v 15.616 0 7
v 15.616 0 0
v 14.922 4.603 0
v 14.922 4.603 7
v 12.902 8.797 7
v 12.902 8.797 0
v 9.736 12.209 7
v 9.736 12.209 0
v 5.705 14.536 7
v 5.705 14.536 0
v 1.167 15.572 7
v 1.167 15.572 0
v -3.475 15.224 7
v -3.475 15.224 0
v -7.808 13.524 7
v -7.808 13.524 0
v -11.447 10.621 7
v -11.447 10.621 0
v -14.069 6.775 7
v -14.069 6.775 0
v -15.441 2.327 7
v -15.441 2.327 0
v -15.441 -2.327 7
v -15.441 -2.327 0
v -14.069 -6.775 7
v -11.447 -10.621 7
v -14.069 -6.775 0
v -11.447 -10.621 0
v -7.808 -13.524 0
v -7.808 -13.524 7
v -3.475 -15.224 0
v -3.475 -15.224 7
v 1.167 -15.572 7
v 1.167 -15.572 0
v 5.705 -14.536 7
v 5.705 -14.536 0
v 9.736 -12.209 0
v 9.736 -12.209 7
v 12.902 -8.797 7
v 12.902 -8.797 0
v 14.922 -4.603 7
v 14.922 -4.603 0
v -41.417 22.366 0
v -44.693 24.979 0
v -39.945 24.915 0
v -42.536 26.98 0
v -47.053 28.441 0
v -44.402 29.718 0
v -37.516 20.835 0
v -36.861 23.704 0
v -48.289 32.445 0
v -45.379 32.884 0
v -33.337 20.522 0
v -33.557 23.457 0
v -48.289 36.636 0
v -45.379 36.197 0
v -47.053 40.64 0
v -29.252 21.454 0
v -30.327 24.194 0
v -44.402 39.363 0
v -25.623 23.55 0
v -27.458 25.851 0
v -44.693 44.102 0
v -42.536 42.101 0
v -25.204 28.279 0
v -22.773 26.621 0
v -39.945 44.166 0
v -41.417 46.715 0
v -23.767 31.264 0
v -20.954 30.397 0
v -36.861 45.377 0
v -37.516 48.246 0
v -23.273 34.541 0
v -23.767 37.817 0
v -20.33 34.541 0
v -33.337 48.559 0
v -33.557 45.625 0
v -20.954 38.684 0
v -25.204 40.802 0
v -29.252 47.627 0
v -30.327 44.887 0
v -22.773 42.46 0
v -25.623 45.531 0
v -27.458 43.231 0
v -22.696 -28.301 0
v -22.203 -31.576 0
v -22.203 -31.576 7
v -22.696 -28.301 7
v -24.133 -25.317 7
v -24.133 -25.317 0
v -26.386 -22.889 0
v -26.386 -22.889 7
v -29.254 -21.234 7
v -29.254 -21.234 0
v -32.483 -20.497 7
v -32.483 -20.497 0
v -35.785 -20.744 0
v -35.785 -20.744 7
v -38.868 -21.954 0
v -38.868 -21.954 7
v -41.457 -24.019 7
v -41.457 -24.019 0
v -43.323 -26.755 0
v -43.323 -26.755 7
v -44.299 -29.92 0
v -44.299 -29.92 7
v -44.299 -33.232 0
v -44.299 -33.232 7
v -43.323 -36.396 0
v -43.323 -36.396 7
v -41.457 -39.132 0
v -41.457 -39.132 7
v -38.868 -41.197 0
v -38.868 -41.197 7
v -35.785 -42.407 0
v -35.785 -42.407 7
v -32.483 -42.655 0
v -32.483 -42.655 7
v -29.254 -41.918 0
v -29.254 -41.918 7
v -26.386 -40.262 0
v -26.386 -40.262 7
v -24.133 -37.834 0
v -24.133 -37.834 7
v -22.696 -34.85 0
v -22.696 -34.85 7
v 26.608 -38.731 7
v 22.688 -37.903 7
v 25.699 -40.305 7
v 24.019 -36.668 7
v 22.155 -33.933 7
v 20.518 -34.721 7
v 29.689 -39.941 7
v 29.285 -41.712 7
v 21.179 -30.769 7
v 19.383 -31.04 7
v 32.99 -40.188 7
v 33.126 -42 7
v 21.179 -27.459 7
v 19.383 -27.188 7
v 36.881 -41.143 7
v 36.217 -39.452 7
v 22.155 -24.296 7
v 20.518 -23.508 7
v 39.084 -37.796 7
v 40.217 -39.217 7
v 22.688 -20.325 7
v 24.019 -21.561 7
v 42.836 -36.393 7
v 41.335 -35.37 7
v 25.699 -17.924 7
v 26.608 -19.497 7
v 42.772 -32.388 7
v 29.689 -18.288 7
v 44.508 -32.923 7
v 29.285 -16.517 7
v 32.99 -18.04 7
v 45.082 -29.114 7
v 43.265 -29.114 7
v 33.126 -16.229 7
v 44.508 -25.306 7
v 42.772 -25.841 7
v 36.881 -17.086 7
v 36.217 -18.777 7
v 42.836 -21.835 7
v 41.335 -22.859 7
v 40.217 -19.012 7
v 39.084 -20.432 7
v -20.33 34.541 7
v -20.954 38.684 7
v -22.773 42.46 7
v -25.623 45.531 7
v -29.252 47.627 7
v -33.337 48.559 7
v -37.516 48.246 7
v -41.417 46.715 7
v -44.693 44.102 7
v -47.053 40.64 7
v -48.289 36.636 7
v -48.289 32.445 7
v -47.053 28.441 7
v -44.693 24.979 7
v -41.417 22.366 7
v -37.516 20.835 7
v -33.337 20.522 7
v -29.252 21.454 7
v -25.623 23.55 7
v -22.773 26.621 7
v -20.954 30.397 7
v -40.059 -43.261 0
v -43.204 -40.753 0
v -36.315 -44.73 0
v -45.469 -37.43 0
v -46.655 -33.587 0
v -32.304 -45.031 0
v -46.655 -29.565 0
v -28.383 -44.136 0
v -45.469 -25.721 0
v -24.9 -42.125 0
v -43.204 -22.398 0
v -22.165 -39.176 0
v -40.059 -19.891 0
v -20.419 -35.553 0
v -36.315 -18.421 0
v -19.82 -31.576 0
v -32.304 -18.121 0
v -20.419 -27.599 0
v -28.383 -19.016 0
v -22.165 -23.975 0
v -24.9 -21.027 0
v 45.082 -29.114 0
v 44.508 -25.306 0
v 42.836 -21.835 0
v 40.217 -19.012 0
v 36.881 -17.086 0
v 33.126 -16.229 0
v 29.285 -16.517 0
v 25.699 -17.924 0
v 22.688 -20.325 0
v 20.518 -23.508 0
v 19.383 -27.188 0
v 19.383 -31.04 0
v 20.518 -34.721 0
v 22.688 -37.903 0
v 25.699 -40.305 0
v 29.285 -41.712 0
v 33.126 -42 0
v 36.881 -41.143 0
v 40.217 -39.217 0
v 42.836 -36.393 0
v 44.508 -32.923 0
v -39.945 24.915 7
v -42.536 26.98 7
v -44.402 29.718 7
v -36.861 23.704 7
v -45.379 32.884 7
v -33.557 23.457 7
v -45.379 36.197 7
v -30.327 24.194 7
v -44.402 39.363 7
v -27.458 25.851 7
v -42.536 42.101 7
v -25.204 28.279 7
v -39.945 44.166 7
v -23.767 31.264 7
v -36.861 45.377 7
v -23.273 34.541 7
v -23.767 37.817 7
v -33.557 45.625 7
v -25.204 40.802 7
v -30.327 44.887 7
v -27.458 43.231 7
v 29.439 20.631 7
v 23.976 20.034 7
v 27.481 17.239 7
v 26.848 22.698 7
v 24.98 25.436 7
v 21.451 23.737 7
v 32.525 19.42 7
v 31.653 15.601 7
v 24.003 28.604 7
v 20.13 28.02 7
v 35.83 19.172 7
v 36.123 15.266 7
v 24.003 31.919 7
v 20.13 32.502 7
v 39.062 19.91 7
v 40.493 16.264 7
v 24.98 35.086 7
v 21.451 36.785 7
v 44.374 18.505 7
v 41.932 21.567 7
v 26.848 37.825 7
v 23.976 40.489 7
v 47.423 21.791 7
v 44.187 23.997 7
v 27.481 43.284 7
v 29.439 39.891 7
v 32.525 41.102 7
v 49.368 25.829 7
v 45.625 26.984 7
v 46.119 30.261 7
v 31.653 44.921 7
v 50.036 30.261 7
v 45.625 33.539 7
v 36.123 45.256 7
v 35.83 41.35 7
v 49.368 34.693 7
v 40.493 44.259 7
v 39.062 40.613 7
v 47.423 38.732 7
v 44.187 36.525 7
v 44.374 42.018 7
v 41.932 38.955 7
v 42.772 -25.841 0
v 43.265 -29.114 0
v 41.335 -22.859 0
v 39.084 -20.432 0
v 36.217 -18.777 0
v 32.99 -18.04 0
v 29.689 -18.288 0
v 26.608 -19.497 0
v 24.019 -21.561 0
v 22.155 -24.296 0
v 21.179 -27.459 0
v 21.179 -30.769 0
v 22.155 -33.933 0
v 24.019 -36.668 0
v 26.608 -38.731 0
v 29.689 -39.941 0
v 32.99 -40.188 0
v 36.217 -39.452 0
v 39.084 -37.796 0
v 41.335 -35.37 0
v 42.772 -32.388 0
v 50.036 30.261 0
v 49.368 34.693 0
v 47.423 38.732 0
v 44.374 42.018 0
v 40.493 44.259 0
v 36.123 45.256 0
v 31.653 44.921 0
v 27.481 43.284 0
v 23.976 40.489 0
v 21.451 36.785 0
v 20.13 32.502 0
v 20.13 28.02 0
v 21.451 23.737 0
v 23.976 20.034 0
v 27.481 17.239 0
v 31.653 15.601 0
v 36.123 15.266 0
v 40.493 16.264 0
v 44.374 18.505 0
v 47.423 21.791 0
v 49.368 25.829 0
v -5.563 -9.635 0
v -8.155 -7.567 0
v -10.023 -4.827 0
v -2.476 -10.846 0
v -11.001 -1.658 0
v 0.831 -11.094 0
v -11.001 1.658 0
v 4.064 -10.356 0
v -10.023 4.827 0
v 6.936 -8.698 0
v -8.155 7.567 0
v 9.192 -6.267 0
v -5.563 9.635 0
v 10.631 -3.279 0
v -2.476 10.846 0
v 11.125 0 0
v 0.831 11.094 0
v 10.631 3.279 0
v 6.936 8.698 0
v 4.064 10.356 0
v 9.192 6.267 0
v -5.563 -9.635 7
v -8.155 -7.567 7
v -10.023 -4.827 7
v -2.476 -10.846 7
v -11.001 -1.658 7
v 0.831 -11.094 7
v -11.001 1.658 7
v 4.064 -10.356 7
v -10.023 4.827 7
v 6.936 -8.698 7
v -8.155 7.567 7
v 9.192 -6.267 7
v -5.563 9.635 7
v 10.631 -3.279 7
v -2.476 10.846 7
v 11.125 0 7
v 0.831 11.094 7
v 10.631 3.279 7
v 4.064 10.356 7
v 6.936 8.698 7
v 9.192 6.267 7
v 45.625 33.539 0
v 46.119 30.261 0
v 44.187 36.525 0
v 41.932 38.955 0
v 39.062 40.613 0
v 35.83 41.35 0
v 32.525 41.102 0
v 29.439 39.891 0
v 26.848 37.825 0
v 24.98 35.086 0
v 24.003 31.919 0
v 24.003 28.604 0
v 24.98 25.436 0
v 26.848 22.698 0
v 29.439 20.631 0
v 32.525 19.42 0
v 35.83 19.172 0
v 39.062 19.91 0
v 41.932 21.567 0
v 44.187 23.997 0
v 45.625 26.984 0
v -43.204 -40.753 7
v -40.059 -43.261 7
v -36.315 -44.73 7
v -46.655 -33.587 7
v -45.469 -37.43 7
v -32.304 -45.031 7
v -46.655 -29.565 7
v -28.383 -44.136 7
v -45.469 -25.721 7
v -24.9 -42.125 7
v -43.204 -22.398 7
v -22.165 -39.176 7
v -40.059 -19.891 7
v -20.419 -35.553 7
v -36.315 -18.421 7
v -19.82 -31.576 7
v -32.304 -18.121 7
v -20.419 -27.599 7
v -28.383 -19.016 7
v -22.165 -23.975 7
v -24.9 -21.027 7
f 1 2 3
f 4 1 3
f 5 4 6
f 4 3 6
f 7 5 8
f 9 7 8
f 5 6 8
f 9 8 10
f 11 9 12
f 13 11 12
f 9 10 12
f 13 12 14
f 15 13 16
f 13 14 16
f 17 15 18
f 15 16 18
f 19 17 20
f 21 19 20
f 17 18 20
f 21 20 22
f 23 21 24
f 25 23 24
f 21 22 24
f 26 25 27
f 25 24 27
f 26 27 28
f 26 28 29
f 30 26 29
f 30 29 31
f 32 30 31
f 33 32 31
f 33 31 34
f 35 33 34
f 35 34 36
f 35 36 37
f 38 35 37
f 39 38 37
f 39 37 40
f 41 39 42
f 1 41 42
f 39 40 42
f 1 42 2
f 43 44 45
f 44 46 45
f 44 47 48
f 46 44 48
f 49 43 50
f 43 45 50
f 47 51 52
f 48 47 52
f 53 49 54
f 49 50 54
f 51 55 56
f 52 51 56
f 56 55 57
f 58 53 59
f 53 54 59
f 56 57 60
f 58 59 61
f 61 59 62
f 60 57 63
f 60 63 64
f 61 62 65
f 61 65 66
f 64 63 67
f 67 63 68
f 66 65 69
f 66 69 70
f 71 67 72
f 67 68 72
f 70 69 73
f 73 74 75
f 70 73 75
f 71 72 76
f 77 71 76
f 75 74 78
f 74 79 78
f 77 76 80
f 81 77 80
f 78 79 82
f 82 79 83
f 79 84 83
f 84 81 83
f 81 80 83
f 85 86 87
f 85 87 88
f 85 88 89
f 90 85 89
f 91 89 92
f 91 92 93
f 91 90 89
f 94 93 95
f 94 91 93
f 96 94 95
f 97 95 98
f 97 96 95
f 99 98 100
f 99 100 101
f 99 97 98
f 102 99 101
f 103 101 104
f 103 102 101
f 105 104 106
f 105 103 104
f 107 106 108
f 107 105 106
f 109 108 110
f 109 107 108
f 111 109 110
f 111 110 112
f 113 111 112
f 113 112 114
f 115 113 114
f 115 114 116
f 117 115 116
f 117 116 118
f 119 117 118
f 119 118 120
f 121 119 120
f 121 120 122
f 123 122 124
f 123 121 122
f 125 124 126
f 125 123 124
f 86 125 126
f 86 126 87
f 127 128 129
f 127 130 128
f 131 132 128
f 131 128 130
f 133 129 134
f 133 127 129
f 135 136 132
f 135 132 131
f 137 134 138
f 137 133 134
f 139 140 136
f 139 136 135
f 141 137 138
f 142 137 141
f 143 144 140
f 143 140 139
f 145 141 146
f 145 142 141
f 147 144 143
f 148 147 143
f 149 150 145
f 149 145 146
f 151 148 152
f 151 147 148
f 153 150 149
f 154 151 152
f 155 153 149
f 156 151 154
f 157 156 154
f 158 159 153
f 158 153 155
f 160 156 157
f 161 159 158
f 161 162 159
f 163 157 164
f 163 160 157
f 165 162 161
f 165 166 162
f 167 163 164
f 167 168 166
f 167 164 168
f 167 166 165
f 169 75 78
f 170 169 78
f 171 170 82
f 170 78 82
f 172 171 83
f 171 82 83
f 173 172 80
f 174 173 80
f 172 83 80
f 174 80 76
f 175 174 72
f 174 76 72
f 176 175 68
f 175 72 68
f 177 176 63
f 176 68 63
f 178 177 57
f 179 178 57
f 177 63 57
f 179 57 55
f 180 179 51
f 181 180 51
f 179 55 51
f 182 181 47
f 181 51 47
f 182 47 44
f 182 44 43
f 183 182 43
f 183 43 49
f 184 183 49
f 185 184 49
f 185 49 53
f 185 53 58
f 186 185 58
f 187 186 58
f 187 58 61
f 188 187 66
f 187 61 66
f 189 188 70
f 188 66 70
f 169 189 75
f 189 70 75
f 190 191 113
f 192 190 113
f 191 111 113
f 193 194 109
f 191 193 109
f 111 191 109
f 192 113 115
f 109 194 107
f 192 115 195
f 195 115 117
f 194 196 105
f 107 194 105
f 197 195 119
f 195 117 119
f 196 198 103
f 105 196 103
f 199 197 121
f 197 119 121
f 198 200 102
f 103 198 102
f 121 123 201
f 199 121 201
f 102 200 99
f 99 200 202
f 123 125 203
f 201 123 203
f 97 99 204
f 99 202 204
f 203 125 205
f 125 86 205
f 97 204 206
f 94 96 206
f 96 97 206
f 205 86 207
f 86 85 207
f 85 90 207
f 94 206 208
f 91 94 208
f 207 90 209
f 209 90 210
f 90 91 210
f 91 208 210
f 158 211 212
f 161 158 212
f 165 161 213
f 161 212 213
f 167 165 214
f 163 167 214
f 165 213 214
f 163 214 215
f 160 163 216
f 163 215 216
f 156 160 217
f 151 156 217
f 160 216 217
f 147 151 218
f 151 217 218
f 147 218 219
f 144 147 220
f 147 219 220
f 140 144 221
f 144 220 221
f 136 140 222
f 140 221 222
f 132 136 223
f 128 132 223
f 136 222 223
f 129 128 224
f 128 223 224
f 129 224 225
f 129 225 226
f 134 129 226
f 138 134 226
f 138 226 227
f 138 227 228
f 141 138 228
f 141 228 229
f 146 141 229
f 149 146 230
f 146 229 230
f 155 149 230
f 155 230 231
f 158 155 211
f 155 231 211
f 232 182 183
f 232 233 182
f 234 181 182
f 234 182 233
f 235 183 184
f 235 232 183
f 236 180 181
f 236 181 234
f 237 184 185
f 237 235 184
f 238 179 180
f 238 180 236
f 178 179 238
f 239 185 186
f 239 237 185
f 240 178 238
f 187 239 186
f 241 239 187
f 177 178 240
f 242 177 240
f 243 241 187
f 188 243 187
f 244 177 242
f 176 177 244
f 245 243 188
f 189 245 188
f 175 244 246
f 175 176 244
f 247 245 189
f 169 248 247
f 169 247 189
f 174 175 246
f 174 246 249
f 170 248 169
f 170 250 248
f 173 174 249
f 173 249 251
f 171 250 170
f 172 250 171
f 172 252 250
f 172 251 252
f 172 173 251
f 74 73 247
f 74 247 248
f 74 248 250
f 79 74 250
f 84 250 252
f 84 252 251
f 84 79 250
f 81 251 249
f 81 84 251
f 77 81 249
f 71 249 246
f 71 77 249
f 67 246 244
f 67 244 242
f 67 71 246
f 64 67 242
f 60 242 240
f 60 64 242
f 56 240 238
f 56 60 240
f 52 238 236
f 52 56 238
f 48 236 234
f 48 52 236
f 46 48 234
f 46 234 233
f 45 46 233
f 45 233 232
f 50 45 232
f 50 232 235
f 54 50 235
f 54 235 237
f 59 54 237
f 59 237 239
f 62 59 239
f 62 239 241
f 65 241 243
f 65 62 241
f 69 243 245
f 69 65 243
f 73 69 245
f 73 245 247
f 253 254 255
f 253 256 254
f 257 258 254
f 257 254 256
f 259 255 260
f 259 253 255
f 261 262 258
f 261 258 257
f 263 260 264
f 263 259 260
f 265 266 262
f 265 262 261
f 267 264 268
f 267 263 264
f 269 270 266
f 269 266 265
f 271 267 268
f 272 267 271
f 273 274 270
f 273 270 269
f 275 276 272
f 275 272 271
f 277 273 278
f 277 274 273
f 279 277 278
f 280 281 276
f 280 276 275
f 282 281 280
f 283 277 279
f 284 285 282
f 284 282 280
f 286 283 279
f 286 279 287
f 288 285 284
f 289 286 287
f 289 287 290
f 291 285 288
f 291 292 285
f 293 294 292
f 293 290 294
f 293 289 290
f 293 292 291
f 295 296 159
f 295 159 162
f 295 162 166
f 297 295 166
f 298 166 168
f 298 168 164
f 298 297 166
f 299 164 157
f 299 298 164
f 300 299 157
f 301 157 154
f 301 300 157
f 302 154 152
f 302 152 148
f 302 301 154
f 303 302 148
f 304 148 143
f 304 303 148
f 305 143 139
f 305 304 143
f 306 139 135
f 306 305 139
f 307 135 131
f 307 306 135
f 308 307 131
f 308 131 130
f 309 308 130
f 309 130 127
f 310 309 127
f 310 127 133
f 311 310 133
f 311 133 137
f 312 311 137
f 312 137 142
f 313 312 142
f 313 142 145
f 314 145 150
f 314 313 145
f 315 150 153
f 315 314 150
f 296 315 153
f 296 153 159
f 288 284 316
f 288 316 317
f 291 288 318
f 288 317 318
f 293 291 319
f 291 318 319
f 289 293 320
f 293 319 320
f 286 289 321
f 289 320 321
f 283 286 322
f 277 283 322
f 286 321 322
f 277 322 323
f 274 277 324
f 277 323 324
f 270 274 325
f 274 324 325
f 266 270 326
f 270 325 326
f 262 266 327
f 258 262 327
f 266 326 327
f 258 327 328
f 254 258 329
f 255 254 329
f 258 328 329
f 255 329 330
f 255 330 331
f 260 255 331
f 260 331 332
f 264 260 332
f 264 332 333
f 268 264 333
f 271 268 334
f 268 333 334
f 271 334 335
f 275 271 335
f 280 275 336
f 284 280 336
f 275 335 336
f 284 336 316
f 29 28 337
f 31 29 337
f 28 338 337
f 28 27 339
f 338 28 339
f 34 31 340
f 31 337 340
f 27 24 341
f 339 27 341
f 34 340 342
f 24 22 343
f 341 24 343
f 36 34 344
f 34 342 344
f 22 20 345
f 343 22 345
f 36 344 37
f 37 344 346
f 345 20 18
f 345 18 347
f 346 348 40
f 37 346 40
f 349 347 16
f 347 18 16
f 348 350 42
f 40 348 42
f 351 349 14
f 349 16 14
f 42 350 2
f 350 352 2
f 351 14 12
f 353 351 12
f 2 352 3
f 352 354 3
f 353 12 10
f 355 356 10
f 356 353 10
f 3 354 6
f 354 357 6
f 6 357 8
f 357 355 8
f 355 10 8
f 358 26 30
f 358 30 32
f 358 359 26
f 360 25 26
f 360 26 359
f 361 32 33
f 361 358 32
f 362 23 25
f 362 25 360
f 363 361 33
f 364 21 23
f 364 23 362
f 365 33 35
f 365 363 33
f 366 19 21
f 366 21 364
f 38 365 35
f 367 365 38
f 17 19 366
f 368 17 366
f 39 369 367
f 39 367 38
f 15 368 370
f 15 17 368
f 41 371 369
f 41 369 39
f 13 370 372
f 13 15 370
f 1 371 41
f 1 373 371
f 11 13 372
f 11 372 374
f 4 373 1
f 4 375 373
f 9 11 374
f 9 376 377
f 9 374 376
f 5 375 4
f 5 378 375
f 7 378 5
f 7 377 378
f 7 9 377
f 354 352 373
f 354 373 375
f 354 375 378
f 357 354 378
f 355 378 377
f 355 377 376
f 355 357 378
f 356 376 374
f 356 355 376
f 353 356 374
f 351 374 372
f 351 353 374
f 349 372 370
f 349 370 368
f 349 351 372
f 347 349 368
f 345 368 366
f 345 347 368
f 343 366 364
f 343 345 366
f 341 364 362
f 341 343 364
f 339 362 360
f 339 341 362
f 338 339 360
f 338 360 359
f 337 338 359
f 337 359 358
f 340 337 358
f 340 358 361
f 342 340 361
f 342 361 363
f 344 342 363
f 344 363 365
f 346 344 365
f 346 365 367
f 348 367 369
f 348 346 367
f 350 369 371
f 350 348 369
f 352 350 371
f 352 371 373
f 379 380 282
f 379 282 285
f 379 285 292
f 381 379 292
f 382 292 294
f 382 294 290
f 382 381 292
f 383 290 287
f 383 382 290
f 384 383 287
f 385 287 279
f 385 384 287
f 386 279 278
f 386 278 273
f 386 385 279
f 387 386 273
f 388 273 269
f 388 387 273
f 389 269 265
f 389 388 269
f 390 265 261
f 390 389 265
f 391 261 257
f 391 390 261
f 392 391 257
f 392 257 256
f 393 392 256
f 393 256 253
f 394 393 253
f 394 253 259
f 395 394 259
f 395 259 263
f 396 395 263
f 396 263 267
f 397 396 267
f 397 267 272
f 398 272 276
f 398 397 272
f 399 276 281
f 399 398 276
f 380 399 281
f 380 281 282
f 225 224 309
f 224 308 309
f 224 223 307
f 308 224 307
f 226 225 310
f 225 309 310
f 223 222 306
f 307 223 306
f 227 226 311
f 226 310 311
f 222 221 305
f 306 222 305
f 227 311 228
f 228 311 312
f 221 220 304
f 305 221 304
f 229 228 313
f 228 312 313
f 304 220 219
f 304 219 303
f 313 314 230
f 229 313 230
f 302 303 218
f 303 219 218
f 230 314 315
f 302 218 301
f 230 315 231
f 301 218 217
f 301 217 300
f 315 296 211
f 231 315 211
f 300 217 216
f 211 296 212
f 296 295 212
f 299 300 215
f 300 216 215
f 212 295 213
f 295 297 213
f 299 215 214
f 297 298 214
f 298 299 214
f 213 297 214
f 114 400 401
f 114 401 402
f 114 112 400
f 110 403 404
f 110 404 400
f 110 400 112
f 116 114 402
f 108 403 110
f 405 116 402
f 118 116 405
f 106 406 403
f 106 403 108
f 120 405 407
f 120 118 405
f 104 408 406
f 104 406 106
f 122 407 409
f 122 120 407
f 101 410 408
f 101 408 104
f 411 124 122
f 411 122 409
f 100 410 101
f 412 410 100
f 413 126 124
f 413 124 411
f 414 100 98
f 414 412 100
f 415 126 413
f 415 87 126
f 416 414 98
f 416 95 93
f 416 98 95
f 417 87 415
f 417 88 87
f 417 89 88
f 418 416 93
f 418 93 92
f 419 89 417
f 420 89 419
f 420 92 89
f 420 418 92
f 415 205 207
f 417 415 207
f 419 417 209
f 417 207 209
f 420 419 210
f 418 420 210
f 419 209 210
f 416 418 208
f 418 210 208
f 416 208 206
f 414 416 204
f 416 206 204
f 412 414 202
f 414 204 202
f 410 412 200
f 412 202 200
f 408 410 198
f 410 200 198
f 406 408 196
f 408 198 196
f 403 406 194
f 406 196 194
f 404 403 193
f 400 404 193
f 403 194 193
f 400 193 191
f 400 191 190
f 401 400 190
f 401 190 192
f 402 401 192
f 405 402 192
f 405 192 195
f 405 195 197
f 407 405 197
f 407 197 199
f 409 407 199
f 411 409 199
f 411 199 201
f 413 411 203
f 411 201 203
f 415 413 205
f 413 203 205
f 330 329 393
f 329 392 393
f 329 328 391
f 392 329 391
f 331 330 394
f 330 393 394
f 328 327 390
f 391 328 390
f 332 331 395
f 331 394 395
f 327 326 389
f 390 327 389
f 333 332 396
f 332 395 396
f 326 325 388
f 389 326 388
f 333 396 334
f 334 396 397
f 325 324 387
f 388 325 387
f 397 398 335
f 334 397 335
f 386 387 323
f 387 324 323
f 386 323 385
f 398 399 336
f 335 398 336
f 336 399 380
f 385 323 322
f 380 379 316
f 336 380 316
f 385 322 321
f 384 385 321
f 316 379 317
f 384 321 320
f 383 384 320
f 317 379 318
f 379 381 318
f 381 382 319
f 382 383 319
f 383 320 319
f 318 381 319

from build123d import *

# Parameters (mm, degrees)
F0_R     = 14.057888
F0_R_2   = 11.115
F0_R_3   = 15.036928
F0_R_4   = 11.12
F0_R_5   = 15.615733
F0_R_6   = 11.125
F0_R_7   = 13.492788
F0_R_8   = 11.11
F0_R_9   = 12.921682
F0_R_10  = 11.105
F1_DEPTH = 7


with BuildPart() as f1:
    # F0 (on Top) → F1 (new body)
    with BuildSketch(Plane.XY):
        with Locations((-34.38776, 34.540586)):
            Circle(F0_R)
        with Locations((-34.38776, 34.540586)):
            Circle(F0_R_2, mode=Mode.SUBTRACT)
        with Locations((34.999091, 30.26122)):
            Circle(F0_R_3)
        with Locations((34.999091, 30.26122)):
            Circle(F0_R_4, mode=Mode.SUBTRACT)
        Circle(F0_R_5)
        Circle(F0_R_6, mode=Mode.SUBTRACT)
        with Locations((-33.312794, -31.575643)):
            Circle(F0_R_7)
        with Locations((-33.312794, -31.575643)):
            Circle(F0_R_8, mode=Mode.SUBTRACT)
        with Locations((32.160033, -29.114258)):
            Circle(F0_R_9)
        with Locations((32.160033, -29.114258)):
            Circle(F0_R_10, mode=Mode.SUBTRACT)
    extrude(amount=F1_DEPTH)


solid = f1.part
